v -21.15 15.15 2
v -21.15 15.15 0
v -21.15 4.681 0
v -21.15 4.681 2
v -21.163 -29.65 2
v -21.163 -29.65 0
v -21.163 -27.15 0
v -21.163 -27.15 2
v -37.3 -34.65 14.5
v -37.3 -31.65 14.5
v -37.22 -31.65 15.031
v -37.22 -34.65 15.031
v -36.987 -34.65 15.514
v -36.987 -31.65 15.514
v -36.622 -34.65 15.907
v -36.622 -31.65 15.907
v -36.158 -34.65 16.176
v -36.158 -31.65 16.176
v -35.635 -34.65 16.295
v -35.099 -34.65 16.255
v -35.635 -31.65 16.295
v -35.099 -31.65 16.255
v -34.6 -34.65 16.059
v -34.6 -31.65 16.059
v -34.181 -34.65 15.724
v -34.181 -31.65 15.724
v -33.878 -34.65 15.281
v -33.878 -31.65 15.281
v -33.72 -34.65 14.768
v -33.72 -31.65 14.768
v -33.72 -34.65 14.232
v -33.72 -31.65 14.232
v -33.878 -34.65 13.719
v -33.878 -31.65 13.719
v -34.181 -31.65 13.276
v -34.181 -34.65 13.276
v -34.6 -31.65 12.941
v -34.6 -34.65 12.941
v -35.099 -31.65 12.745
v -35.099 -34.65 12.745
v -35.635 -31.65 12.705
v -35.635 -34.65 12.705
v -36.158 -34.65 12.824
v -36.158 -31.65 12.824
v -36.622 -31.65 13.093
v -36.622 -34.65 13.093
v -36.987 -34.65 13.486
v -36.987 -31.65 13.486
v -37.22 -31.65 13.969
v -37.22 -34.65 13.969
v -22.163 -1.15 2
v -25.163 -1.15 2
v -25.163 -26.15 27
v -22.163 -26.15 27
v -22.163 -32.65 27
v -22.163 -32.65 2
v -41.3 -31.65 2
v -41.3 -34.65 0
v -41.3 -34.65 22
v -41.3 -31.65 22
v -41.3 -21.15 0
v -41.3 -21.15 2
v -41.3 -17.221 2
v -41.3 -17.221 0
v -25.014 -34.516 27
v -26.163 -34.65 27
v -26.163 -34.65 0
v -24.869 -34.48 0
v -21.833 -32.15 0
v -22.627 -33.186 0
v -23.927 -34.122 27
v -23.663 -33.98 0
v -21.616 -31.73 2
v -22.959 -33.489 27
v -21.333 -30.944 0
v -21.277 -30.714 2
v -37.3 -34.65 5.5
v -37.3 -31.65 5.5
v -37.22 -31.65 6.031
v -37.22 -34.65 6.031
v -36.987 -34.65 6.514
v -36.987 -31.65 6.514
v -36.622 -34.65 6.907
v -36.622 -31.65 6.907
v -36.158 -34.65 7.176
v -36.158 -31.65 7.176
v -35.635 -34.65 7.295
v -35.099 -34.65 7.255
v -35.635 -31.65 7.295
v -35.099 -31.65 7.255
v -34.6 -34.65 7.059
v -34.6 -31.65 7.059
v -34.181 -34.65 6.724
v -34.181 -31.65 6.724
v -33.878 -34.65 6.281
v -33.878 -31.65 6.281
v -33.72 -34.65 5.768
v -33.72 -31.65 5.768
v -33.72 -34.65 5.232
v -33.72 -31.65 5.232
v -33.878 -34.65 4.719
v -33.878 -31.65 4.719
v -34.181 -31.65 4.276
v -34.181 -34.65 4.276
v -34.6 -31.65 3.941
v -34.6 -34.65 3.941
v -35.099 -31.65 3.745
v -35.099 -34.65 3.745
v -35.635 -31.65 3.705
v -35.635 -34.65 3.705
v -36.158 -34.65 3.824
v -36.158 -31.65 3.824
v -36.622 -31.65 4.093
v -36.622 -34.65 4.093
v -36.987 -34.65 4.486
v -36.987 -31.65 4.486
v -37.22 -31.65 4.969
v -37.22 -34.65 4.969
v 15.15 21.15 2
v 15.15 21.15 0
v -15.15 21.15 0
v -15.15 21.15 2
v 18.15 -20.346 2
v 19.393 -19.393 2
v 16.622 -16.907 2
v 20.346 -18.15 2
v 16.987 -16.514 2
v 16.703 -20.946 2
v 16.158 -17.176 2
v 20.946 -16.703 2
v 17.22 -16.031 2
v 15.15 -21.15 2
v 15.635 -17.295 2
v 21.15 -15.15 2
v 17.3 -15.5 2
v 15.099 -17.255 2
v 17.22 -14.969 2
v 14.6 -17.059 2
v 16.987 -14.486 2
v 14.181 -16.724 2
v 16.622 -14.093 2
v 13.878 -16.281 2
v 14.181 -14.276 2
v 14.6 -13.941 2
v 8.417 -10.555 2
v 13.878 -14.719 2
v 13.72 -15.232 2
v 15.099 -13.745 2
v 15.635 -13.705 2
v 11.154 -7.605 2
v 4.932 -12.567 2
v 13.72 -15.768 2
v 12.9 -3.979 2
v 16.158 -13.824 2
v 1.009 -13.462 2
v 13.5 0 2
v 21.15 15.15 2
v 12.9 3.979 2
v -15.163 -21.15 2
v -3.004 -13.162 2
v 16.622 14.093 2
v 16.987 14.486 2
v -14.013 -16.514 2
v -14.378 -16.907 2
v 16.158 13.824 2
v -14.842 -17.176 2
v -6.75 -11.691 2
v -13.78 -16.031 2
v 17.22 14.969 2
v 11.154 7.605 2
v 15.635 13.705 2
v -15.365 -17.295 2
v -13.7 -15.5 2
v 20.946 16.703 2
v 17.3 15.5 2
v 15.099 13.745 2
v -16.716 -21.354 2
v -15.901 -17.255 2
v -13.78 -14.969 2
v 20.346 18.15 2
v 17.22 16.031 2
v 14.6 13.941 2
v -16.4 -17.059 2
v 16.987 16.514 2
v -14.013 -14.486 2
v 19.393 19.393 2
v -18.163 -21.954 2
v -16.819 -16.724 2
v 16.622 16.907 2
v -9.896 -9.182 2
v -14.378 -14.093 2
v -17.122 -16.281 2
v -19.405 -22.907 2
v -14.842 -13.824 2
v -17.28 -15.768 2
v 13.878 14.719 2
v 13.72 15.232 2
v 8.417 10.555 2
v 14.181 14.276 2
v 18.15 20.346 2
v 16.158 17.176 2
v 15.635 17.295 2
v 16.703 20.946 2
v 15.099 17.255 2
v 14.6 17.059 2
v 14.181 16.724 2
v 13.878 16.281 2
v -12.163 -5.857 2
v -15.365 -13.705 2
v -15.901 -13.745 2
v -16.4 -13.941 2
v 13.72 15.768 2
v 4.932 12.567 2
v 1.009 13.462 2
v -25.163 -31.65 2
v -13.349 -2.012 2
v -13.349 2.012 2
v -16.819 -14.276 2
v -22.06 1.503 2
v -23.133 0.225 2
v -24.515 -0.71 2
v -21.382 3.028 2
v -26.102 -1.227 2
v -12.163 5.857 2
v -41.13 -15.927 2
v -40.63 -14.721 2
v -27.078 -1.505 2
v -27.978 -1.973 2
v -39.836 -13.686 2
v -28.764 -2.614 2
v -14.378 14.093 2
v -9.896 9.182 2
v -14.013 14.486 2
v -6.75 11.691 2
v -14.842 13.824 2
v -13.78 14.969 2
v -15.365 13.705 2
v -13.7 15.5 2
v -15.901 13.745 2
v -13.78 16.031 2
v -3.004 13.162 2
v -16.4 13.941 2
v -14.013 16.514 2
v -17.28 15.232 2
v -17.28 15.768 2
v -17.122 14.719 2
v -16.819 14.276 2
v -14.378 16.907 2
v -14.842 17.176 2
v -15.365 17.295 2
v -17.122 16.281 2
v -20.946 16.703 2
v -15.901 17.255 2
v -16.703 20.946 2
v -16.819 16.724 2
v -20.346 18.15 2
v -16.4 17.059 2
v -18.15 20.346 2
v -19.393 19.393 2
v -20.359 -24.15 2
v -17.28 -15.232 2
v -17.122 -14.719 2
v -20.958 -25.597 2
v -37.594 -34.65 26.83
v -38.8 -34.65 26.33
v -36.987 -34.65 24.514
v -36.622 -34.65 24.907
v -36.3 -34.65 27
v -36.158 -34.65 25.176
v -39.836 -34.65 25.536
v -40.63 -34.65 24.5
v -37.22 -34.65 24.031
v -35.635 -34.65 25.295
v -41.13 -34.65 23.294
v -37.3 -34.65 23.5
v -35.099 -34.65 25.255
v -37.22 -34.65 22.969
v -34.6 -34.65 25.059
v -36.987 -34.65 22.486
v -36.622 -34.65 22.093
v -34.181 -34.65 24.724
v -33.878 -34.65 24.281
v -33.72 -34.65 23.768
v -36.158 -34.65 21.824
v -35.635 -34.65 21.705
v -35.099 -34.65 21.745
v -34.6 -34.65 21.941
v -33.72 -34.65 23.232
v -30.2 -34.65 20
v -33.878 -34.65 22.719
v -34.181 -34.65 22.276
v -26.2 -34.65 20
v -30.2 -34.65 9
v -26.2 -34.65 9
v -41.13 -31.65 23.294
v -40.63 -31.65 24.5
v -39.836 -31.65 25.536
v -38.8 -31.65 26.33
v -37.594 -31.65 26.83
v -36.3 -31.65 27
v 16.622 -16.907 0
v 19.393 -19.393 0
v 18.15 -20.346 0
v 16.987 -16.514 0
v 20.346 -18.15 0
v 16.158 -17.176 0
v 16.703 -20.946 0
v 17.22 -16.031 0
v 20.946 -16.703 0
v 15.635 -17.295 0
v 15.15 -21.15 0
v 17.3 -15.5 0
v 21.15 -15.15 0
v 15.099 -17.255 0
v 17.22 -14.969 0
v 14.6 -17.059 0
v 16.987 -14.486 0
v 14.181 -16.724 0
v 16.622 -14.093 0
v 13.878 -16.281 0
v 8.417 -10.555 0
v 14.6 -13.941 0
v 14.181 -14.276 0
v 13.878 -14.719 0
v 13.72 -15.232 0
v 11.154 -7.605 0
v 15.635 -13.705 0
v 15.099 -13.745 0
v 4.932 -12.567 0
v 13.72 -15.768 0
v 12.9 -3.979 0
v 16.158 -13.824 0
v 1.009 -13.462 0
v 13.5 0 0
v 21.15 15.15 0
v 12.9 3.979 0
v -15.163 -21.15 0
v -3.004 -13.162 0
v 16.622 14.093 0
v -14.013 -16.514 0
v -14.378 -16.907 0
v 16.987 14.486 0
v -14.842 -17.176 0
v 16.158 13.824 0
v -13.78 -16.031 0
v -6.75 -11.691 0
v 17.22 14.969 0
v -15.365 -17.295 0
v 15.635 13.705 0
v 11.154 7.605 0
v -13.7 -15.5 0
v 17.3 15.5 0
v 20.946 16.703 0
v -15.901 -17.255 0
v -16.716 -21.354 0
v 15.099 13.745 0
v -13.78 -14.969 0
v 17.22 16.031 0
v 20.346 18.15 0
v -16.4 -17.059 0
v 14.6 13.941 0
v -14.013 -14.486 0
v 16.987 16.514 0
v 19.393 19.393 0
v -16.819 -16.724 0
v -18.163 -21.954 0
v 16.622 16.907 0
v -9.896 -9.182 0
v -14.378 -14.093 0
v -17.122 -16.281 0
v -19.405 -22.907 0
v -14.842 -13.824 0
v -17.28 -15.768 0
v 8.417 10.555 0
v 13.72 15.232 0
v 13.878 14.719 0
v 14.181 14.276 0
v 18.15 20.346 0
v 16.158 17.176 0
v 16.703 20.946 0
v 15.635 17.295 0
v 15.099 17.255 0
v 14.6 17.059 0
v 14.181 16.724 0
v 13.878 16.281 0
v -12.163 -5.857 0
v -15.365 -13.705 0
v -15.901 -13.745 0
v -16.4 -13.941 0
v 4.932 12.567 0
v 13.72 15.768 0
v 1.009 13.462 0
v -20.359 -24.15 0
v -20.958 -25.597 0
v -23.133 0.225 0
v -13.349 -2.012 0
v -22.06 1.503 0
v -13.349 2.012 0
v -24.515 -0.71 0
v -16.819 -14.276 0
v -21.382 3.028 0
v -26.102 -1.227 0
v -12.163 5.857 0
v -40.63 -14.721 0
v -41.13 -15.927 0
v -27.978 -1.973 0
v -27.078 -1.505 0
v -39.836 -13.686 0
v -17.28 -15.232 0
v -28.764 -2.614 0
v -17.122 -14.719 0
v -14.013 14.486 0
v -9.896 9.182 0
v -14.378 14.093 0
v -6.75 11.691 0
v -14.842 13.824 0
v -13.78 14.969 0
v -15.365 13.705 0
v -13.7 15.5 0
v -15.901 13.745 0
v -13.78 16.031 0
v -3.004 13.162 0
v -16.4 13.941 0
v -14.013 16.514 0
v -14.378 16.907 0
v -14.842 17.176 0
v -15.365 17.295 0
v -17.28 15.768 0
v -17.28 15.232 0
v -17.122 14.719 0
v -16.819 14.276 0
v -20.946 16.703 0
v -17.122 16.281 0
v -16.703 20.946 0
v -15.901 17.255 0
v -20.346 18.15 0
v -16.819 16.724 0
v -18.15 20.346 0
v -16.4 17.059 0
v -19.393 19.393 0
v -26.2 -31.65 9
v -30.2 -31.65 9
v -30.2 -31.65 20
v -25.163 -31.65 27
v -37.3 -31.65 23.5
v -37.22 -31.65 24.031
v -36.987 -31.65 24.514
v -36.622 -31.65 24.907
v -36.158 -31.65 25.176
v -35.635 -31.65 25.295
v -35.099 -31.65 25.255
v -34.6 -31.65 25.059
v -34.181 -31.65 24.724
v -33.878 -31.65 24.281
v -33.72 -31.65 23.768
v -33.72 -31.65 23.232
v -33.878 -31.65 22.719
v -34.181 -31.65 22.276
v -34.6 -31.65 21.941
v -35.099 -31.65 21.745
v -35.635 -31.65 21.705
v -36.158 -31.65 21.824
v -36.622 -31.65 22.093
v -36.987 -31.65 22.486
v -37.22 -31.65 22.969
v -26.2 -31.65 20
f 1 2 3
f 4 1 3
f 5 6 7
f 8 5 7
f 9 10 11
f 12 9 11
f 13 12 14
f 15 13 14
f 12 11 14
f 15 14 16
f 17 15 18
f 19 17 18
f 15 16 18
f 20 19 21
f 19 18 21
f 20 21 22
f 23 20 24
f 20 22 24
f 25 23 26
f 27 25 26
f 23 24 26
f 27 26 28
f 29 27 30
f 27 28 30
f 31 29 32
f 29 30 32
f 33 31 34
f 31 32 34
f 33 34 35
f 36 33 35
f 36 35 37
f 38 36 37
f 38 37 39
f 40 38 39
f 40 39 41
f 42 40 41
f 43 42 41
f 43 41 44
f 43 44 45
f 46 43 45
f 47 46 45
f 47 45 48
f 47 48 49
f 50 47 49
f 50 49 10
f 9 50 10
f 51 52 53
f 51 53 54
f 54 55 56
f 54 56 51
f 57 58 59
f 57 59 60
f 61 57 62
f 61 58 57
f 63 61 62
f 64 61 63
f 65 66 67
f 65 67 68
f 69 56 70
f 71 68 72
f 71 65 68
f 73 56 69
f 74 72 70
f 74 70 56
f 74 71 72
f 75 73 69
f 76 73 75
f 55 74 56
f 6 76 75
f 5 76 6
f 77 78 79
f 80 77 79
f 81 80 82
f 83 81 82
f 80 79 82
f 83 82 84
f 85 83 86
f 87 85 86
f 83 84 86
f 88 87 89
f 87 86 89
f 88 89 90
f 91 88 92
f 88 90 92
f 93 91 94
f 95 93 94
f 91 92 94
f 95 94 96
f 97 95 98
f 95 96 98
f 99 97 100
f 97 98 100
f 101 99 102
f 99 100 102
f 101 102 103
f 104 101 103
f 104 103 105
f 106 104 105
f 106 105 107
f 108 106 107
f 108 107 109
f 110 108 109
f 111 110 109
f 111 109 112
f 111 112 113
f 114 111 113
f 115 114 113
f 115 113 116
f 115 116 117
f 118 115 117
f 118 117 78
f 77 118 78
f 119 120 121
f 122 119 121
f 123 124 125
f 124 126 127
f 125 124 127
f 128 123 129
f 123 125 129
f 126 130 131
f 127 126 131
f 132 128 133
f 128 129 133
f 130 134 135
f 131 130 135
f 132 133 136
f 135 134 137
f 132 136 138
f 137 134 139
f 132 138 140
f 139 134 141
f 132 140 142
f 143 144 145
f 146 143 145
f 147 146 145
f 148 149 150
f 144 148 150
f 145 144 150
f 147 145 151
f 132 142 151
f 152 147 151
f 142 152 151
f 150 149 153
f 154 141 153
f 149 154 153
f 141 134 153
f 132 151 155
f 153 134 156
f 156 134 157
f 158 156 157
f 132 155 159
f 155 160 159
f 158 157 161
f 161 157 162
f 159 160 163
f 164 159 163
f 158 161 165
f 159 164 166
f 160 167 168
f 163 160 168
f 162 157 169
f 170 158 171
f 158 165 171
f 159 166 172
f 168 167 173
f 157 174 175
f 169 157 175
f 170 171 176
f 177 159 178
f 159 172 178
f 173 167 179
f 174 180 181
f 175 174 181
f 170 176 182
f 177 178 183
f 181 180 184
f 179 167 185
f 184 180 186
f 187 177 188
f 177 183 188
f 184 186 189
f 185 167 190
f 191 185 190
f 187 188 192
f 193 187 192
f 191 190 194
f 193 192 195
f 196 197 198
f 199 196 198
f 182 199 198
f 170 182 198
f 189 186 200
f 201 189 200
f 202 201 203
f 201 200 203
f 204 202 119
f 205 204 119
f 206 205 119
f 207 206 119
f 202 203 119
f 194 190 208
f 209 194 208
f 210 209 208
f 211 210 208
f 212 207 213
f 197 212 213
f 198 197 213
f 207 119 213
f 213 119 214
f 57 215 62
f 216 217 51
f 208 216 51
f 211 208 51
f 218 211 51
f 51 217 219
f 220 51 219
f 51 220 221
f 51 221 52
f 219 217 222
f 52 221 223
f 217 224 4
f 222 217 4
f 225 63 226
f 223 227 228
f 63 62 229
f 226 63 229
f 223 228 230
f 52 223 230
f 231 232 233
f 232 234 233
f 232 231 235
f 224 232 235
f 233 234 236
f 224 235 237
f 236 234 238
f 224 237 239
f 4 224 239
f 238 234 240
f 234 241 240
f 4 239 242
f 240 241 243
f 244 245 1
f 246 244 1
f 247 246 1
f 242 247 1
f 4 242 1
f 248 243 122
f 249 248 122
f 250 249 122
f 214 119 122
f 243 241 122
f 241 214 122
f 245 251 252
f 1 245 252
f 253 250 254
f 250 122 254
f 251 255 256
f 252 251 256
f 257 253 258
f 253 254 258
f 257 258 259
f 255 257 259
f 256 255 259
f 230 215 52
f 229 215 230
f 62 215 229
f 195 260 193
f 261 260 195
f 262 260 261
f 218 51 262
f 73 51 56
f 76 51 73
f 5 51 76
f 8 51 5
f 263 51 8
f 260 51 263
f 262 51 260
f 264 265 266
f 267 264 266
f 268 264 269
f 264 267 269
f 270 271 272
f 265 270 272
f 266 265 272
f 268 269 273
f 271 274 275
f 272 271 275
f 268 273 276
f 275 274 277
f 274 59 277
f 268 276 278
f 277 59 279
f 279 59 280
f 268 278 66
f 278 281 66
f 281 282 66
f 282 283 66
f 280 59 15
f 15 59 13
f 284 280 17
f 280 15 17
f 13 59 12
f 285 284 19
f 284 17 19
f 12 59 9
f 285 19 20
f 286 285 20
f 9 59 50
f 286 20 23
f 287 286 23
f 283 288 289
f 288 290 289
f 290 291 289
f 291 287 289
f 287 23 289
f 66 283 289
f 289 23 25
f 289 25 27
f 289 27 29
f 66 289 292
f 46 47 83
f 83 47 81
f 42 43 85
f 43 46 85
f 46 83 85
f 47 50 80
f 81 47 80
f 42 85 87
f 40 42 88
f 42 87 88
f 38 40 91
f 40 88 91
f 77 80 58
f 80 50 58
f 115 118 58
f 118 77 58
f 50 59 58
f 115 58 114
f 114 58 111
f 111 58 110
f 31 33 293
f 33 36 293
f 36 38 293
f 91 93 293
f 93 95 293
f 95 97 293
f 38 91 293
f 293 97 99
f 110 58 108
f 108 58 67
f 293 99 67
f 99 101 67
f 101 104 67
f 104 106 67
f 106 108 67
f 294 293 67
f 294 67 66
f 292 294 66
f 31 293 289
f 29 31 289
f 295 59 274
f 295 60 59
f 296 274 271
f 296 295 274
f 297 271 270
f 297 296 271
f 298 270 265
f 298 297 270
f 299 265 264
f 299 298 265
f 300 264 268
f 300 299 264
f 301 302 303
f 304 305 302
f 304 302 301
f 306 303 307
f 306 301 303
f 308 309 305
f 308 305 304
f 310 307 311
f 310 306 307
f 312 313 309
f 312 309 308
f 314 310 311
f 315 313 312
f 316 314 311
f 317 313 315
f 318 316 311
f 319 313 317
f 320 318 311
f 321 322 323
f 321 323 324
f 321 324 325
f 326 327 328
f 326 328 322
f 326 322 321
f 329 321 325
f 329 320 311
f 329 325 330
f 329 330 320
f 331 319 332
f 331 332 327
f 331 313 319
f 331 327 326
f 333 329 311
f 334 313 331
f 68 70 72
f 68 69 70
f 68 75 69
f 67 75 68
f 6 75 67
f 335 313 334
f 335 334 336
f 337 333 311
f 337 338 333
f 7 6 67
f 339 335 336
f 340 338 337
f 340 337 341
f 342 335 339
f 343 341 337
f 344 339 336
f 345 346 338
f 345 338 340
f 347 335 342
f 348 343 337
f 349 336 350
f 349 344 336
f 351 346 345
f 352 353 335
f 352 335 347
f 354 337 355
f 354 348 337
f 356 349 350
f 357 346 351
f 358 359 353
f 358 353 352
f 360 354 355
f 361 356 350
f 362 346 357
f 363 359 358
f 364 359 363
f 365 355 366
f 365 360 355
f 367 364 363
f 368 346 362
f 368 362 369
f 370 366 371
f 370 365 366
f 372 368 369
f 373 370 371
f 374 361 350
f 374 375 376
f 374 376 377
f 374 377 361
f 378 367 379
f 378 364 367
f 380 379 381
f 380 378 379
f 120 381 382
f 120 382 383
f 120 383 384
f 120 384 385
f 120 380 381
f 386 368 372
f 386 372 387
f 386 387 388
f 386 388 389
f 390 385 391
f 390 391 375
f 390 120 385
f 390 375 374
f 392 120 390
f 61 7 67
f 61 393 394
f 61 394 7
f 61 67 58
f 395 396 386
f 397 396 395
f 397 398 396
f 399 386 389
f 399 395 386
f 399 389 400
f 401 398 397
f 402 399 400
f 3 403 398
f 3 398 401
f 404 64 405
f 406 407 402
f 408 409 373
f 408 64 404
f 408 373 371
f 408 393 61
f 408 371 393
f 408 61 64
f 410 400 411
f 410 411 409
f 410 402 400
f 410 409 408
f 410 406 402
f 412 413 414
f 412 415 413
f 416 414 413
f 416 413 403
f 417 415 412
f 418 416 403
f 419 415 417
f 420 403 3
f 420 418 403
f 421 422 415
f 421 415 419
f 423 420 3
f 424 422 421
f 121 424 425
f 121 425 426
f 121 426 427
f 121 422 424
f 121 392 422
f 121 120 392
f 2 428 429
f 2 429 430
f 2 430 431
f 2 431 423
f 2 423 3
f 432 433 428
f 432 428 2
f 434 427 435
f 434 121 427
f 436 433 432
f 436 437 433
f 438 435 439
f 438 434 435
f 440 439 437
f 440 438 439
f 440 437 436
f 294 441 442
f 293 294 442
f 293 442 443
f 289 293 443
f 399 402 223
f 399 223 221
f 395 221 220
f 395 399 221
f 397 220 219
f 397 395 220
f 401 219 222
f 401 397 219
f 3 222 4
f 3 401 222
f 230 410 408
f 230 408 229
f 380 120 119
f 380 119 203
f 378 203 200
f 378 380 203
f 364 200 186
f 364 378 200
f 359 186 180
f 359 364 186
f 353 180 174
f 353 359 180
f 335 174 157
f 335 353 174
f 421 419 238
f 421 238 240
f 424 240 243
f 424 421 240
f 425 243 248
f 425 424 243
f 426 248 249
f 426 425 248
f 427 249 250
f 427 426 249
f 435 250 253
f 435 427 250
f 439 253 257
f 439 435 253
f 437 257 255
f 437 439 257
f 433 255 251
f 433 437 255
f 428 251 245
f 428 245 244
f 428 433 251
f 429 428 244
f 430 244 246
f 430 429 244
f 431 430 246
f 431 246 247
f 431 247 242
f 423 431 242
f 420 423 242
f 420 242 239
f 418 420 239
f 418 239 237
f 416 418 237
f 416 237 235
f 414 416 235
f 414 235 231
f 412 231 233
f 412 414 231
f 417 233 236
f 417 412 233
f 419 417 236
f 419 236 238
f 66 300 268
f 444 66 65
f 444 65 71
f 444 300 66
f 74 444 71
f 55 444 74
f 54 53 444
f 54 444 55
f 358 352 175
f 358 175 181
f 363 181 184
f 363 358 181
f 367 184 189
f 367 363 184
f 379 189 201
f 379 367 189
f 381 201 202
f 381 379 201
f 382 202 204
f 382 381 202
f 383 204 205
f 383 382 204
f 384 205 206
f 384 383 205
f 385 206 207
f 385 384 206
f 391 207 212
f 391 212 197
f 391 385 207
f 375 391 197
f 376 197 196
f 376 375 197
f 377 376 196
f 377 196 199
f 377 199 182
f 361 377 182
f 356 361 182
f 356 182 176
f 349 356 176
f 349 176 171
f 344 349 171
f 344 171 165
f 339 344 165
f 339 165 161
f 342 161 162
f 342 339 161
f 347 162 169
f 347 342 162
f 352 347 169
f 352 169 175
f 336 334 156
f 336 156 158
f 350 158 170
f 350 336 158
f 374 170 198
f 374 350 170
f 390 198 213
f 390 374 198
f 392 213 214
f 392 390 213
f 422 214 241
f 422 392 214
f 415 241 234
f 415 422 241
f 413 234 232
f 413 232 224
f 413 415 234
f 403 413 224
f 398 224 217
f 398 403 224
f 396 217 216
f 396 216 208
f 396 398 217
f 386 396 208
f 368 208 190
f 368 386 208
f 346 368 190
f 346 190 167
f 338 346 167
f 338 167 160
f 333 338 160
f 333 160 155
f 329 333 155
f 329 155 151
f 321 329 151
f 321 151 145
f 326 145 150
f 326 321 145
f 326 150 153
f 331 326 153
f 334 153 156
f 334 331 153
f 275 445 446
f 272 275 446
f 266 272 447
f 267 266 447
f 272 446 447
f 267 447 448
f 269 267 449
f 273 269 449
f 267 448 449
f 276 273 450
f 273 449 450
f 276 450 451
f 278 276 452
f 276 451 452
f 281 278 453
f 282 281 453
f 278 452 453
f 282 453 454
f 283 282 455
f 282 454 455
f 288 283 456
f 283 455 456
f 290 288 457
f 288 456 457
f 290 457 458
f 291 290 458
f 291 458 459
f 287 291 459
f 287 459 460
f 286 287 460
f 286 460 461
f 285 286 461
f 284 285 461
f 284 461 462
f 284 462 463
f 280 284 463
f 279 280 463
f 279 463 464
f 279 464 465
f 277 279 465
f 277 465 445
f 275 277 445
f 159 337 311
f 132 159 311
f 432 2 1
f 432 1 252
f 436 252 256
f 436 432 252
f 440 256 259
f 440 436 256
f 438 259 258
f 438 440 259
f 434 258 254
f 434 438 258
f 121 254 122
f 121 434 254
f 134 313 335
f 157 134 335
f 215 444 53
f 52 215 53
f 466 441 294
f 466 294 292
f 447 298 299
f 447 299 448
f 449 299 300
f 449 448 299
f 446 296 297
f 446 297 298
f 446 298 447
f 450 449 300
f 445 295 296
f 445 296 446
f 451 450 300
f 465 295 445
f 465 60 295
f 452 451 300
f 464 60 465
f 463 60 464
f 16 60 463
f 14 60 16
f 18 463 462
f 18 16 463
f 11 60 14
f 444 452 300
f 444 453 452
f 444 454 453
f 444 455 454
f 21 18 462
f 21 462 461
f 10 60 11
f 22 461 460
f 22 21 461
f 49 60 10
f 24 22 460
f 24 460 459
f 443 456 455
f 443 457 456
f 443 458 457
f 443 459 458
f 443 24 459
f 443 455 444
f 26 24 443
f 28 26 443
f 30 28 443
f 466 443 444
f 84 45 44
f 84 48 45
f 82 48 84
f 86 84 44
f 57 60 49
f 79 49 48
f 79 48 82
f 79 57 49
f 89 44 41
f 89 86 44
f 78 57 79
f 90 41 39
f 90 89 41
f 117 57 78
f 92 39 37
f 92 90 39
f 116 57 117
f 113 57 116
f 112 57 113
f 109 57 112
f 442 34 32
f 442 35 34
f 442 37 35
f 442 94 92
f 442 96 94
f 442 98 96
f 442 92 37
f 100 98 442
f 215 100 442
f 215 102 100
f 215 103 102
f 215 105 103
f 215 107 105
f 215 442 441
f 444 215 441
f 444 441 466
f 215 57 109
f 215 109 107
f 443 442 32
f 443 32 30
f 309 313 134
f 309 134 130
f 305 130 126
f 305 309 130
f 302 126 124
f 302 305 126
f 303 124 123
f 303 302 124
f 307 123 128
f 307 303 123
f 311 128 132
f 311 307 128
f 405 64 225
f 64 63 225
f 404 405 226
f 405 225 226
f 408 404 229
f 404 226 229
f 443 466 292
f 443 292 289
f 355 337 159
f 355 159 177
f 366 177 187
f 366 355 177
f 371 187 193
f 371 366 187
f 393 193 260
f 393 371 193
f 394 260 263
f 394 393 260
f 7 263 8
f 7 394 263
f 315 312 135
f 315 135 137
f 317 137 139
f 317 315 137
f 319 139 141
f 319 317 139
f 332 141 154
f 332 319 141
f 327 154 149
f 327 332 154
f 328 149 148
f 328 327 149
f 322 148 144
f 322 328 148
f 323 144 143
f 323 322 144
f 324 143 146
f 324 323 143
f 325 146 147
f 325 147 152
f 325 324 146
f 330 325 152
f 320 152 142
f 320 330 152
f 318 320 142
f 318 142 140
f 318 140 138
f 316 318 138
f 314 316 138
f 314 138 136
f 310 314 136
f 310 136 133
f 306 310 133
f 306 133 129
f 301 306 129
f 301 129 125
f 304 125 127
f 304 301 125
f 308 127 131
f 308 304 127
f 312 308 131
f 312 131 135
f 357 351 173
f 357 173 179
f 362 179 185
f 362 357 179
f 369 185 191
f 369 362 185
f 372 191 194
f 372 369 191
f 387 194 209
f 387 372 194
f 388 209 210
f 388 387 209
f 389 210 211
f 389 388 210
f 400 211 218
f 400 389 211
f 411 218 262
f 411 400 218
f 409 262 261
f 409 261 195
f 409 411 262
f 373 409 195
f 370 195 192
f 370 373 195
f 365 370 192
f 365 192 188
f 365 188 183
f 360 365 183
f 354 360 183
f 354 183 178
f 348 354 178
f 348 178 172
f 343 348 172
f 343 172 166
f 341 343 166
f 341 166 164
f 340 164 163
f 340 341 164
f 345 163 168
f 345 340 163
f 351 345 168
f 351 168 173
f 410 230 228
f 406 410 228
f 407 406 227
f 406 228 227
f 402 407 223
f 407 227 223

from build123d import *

# Parameters (mm, degrees)
F0_R         = 1.8
F0_R_2       = 13.5
F0_W         = 20.1372796029
F0_H         = 13.5
F1_DEPTH     = 2
F2_W         = 3
F2_H         = 33.5
F3_DEPTH     = 27
F4_W         = 16.1372796029
F4_H         = 3
F5_DEPTH     = 25
F6_R         = 1.8
F6_W         = 4
F6_H         = 11
F7_DEPTH     = 25
F8_SIZE      = 25
F9_SIZE      = 14
F10_R        = 5
F11_T1_DEPTH = 2
F11_T3_DEPTH = 32


# Not quite as in the source:
# - a fillet or chamfer that OpenCascade refuses, or shapes differently, is made with other operations: its cross-section is extruded or revolved along the edge and cut away or added


with BuildPart() as f1:
    # F0 (on Top) → F1 (new body)
    with BuildSketch(Plane.XY):
        Polygon((21.15, -21.15), (21.15, 21.15), (-21.15, 21.15), (-21.15, -1.15), (-21.15, -21.15), align=None)
        with Locations((-15.5, -15.5)):
            Circle(F0_R, mode=Mode.SUBTRACT)
        with Locations((15.5, -15.5)):
            Circle(F0_R, mode=Mode.SUBTRACT)
        with Locations((-15.5, 15.5)):
            Circle(F0_R, mode=Mode.SUBTRACT)
        Circle(F0_R_2, mode=Mode.SUBTRACT)
        with Locations((15.5, 15.5)):
            Circle(F0_R, mode=Mode.SUBTRACT)
        Polygon((-21.15, -21.15), (-21.15, -1.15), (-41.3, -1.15), (-41.3, -21.15), (-21.1627203971, -21.15), align=None)
        with Locations((-31.2313601986, -27.9)):
            Rectangle(F0_W, F0_H)
    extrude(amount=F1_DEPTH)

    # F2 (on Top) → F3 (join)
    with BuildSketch(Plane.XY):
        with Locations((-23.6627203971, -17.9)):
            Rectangle(F2_W, F2_H)
    extrude(amount=F3_DEPTH)

    # F4 (on face) → F5 (join)
    with BuildSketch(Plane.XY.offset(2)):
        with Locations((-33.2313601986, -33.15)):
            Rectangle(F4_W, F4_H)
    extrude(amount=F5_DEPTH)

    # F6 (on face) → F7 (cut)
    with BuildSketch(Plane(origin=(0, -31.65, 0), x_dir=(-1, 0, 0), z_dir=(0, 1, 0))):
        with Locations((35.5, 14.5)):
            Circle(F6_R)
        with Locations((35.5, 5.5)):
            Circle(F6_R)
        with Locations((35.5, 23.5)):
            Circle(F6_R)
        with Locations((28.2, 14.5)):
            Rectangle(F6_W, F6_H)
    extrude(amount=-F7_DEPTH, mode=Mode.SUBTRACT)

    # F8
    f8_edges = [f1.edges().sort_by_distance(p)[0] for p in [
        (-23.66272, -1.15, 27),
    ]]
    chamfer(f8_edges, length=F8_SIZE)

    # F9
    f9_edges = [f1.edges().sort_by_distance(p)[0] for p in [
        (-41.3, -1.15, 1),
    ]]
    chamfer(f9_edges, length=F9_SIZE)

    # F10
    f10_edges = [f1.edges().sort_by_distance(p)[0] for p in [
        (-41.3, -15.15, 1),
        (-27.3, -1.15, 1),
        (-21.16272, -34.65, 1),
        (-41.3, -33.15, 27),
    ]]
    fillet(f10_edges, radius=F10_R)

    # F11: fillet of radius 6 on 5 edges, made by hand

    # F11_s2 → F11_t1 (join)
    with BuildSketch(Plane.XY):
        with BuildLine():
            ThreePointArc((-26.1021448299, -1.2268404777), (-22.5517867046, 0.826546392), (-21.15, 4.6809509491))
            Line((-21.15, 4.6809509491), (-20.55, 4.6809509491))
            Line((-20.55, 4.6809509491), (-20.55, -1.15))
            Line((-20.55, -1.15), (-21.15, -1.75))
            ThreePointArc((-21.15, -1.75), (-25.2289321881, -1.75), (-25.9973593129, -1.8176196204))
            Line((-25.9973593129, -1.8176196204), (-26.1021448299, -1.2268404777))
        make_face()
        with BuildLine():
            ThreePointArc((-15.1627203971, -21.15), (-19.4053610842, -22.9073593129), (-21.1627203971, -27.15))
            Line((-21.1627203971, -27.15), (-21.1627203971, -21.15))
            Line((-21.1627203971, -21.15), (-15.1627203971, -21.15))
        make_face()
    extrude(amount=F11_T1_DEPTH)

    # F11_s4 → F11_t3 (cut)
    with BuildSketch(Plane.XY.offset(-15)):
        with BuildLine():
            ThreePointArc((21.15, -15.15), (19.3926406871, -19.3926406871), (15.15, -21.15))
            Line((15.15, -21.15), (21.15, -21.15))
            Line((21.15, -21.15), (21.15, -15.15))
        make_face()
        with BuildLine():
            ThreePointArc((15.15, 21.15), (19.3926406871, 19.3926406871), (21.15, 15.15))
            Line((21.15, 15.15), (21.15, 21.15))
            Line((21.15, 21.15), (15.15, 21.15))
        make_face()
        with BuildLine():
            ThreePointArc((-21.15, 15.15), (-19.3926406871, 19.3926406871), (-15.15, 21.15))
            Line((-15.15, 21.15), (-21.15, 21.15))
            Line((-21.15, 21.15), (-21.15, 15.15))
        make_face()
    extrude(amount=F11_T3_DEPTH, mode=Mode.SUBTRACT)


solid = f1.part
